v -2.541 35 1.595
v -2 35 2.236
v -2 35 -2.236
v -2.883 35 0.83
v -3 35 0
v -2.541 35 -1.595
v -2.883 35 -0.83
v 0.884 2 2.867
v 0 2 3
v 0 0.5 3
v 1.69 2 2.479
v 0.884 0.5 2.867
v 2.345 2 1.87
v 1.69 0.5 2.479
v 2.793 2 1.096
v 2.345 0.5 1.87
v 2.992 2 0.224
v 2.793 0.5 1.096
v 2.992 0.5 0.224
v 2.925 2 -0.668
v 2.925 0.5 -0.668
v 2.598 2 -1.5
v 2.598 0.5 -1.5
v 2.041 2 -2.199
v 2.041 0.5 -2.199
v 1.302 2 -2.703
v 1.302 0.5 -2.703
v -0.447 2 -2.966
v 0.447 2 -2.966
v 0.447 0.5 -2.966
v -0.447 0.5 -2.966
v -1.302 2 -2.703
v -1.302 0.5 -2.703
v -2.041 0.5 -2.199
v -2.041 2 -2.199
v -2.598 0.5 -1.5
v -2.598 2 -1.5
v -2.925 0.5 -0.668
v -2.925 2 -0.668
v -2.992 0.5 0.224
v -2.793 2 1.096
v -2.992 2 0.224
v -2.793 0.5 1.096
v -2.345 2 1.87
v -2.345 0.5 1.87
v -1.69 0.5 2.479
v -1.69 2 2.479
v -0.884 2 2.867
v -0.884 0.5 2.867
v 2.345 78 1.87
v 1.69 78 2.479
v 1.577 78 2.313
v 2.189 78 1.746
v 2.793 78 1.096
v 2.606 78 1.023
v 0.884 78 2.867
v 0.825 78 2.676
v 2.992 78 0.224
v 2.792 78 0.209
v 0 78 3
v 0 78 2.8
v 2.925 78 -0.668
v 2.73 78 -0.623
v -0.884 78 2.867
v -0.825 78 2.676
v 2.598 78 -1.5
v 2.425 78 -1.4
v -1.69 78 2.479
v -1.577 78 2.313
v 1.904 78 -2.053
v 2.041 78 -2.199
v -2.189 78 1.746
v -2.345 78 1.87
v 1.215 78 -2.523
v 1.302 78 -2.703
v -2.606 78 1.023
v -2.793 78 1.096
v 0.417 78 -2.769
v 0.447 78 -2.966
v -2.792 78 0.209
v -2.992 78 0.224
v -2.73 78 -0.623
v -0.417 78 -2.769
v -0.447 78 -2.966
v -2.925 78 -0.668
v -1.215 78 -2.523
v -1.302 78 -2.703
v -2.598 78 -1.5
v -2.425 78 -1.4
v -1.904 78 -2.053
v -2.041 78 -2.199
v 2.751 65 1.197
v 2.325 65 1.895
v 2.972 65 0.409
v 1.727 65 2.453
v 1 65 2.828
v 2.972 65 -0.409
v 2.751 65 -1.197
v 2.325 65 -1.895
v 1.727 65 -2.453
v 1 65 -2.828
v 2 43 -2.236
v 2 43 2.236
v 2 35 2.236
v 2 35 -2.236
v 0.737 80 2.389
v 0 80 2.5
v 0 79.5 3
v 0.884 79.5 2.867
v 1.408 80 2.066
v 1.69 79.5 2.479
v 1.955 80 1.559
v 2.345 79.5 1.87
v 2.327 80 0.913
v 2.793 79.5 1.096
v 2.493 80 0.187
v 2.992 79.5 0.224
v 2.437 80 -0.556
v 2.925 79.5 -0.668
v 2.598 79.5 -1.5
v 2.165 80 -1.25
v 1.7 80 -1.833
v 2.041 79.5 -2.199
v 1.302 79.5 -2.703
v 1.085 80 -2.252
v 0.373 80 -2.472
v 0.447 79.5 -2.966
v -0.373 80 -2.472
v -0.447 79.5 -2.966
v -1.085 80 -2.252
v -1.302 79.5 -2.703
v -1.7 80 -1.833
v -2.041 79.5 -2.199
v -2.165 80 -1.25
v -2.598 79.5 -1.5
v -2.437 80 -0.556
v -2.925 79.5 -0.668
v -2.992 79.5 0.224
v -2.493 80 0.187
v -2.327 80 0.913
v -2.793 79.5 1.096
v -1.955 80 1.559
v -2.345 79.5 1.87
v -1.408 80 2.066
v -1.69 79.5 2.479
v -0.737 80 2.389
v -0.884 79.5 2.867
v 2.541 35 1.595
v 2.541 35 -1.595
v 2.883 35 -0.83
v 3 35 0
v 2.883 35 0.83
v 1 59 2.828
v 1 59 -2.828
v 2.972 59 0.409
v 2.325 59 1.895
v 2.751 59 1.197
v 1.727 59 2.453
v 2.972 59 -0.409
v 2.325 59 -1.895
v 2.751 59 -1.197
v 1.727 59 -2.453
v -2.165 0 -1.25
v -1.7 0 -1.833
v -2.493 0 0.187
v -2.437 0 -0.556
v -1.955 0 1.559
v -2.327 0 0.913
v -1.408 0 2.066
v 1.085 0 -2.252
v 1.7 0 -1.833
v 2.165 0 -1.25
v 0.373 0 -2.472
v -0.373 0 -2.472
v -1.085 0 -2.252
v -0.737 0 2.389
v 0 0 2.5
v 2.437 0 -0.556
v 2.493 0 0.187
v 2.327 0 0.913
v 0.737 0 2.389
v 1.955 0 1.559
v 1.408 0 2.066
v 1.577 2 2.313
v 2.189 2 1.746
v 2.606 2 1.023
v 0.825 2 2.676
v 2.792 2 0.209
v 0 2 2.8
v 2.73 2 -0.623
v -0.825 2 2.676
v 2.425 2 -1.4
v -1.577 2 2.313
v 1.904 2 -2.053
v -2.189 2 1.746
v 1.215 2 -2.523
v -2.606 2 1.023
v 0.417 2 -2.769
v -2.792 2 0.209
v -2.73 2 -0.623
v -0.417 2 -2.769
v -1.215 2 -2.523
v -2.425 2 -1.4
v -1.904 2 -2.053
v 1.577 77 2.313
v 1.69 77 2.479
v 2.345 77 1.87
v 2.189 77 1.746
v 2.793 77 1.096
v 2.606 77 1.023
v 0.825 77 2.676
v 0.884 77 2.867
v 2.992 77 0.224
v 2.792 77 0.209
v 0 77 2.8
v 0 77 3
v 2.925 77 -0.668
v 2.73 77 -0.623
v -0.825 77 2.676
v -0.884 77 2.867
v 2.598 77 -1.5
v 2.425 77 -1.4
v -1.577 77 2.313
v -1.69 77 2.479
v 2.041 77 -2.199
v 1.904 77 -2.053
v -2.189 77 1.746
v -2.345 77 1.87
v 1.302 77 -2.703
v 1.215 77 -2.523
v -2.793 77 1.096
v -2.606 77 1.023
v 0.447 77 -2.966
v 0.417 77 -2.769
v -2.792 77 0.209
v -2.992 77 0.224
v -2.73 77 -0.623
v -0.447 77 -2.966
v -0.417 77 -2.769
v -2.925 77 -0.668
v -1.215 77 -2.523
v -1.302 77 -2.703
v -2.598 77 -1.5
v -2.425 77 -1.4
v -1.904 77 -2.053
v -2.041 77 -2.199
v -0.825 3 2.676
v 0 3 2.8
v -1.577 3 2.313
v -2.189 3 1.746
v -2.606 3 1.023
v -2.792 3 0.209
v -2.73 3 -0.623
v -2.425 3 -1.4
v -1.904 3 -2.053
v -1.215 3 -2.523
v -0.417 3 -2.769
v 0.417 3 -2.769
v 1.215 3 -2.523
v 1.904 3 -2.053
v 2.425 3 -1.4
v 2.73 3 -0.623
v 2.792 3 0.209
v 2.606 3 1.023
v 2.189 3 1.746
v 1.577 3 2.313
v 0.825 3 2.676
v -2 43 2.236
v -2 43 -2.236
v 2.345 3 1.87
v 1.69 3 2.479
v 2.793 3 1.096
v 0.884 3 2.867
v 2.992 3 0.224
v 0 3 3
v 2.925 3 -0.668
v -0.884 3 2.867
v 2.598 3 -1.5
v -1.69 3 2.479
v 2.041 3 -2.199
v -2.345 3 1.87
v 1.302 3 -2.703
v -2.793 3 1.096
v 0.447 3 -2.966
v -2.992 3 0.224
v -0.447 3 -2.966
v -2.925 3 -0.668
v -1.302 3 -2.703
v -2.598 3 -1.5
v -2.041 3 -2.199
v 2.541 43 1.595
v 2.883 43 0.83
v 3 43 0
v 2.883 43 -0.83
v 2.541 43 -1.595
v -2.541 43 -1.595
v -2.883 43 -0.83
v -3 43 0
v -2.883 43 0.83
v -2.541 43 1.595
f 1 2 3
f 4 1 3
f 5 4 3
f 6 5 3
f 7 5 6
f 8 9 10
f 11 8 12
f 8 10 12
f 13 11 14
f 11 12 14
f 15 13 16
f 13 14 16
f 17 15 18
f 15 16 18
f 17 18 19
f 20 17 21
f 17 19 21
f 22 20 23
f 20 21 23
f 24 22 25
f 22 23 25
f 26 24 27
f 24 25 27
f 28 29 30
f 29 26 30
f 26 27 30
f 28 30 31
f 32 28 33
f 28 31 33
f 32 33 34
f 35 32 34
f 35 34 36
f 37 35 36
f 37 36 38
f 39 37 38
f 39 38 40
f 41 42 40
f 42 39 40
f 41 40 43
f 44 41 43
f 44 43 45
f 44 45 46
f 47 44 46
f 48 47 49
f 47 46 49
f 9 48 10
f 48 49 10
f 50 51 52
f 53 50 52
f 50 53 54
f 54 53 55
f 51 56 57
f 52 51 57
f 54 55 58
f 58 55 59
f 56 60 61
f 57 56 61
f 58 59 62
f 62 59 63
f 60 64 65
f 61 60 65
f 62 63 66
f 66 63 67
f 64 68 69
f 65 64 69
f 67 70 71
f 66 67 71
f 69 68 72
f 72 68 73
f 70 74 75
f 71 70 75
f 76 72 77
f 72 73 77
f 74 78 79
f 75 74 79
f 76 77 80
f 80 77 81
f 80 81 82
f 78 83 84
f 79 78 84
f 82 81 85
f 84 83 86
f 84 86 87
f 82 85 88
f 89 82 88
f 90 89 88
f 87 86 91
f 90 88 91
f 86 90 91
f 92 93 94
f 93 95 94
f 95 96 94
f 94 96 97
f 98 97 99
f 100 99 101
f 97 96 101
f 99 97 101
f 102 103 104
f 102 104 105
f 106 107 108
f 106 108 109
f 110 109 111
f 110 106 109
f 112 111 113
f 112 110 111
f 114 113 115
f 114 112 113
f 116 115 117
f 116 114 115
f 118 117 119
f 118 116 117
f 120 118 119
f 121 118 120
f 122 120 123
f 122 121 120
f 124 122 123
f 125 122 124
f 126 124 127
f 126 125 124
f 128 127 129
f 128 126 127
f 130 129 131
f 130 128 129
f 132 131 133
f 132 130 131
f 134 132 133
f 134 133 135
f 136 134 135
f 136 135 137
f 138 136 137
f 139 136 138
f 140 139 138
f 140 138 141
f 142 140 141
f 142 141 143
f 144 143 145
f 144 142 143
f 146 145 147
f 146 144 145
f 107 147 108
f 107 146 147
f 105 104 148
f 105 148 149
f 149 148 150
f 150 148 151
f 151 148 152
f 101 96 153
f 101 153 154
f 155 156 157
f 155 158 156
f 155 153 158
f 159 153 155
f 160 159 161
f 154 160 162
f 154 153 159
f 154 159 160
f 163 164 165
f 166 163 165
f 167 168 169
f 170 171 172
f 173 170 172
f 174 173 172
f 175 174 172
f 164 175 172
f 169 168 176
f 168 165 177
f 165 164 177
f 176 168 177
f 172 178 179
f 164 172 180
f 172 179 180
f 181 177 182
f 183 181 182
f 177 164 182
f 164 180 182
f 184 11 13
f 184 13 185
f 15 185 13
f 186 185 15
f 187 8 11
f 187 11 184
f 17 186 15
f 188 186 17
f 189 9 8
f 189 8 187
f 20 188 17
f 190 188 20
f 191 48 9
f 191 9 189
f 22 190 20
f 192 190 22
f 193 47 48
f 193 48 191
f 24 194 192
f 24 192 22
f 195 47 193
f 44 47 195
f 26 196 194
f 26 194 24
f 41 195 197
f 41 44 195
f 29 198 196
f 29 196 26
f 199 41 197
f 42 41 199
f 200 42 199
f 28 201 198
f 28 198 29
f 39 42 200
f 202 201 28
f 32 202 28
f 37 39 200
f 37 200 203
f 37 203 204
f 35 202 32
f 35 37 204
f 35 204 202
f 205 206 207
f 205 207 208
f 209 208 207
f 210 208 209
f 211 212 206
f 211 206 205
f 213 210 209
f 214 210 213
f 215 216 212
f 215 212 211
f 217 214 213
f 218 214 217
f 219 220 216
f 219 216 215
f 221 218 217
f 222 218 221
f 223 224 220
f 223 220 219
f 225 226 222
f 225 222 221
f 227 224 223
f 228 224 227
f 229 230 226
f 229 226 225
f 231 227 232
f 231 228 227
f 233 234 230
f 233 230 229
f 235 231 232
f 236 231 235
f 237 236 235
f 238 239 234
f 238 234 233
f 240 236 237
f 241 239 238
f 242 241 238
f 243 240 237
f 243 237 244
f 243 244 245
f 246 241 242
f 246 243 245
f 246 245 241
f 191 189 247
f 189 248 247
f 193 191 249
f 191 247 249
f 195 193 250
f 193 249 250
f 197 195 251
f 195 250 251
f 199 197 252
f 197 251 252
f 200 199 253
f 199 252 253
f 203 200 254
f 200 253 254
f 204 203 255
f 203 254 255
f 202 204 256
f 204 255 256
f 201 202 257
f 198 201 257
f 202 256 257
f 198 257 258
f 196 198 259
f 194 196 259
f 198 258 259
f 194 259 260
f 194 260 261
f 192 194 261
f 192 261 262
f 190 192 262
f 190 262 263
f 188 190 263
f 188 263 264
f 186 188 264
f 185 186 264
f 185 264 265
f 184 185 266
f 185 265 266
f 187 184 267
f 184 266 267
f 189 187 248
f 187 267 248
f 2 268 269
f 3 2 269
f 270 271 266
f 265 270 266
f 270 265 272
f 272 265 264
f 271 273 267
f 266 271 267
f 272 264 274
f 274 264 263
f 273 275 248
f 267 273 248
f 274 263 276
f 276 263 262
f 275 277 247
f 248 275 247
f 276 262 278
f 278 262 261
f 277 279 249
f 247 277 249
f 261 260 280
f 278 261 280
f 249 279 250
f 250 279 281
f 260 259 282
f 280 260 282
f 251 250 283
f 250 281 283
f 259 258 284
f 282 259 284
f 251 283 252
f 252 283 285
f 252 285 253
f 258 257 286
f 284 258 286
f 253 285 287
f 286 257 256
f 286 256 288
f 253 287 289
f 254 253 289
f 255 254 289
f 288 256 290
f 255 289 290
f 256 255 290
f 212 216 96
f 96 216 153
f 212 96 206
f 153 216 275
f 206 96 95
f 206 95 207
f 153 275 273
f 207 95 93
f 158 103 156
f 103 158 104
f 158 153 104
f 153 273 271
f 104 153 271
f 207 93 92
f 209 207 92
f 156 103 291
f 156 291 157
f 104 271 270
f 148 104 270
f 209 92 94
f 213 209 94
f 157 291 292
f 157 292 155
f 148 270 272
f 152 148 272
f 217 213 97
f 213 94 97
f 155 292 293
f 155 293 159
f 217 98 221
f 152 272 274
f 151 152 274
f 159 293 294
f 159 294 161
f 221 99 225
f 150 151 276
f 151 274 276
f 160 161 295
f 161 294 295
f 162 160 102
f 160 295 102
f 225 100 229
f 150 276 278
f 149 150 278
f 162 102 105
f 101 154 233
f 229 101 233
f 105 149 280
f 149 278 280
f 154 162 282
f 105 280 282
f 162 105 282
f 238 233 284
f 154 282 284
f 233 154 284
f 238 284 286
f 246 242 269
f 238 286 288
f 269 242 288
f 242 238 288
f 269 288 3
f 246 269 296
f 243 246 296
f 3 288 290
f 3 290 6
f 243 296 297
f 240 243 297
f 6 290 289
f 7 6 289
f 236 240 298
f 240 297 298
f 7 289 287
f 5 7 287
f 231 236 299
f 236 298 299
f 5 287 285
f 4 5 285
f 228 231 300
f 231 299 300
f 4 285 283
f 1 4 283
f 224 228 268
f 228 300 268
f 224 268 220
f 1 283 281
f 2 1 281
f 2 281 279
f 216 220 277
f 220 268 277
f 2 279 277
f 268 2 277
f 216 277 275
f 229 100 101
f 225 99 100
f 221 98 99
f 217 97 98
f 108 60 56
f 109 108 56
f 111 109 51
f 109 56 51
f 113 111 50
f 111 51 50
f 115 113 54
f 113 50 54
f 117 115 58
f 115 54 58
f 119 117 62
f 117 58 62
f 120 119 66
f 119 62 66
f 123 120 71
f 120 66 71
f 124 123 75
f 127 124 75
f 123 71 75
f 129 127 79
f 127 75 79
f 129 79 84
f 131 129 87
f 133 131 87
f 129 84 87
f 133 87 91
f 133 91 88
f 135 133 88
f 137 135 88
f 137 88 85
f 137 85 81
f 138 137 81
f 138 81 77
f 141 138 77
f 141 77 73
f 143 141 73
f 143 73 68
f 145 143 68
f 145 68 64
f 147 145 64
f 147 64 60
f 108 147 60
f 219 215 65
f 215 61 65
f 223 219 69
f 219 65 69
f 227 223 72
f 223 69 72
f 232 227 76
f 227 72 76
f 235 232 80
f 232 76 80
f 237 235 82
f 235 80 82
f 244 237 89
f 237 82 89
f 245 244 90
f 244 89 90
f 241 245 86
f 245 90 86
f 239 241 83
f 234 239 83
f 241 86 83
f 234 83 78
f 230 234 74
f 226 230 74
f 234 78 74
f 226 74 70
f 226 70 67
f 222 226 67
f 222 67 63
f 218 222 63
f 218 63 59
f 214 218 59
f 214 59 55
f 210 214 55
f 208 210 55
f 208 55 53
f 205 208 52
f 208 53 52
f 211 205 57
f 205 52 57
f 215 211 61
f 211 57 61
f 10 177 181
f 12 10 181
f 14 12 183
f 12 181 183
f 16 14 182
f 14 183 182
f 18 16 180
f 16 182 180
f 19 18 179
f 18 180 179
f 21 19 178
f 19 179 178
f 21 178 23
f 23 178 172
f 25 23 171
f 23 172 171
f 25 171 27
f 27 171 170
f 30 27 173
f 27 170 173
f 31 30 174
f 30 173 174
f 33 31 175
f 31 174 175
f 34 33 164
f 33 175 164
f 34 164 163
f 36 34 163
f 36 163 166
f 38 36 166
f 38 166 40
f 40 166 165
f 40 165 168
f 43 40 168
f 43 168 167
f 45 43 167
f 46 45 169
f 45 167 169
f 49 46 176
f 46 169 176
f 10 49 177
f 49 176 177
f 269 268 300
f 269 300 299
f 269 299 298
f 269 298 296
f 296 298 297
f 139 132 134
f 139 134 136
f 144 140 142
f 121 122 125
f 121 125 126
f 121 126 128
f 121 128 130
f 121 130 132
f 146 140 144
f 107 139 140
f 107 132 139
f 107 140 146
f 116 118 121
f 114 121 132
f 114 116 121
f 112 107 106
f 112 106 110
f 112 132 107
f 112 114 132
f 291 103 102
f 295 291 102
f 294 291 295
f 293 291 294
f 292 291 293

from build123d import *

# Parameters (mm, degrees)
CROQUIS1_R              = 3
SALIENTE_EXTRUIR1_DEPTH = 80
CROQUIS2_W              = 5.531234996
CROQUIS2_H              = 1
CORTAR_EXTRUIR1_REACH   = 83.112
CORTAR_EXTRUIR1_START   = 1
CROQUIS3_W              = 6
CROQUIS3_H              = 6
CORTAR_EXTRUIR3_REACH   = 84.112
CORTAR_EXTRUIR3_START   = -2
CROQUIS3_2_W            = 6
CROQUIS3_2_H            = 8
CORTAR_EXTRUIR4_REACH   = 84.112
CORTAR_EXTRUIR4_START   = 2
CROQUIS3_4_W            = 6
CROQUIS3_4_H            = 8
CHAFL_N1_SIZE           = 0.5


with BuildPart() as part:
    # Croquis1 → Saliente-Extruir1 (new body)
    with BuildSketch(Plane(origin=(0, 0, 0), x_dir=(1, 0, 0), z_dir=(0, 1, 0))):
        Circle(CROQUIS1_R)
    extrude(amount=SALIENTE_EXTRUIR1_DEPTH)

    # Croquis2 → Cortar-Revolución1 (revolve, cut)
    with BuildSketch(Plane.XY):
        with Locations((5.565617498, 77.5)):
            Rectangle(CROQUIS2_W, CROQUIS2_H)
        with Locations((5.565617498, 2.5)):
            Rectangle(CROQUIS2_W, CROQUIS2_H)
    revolve(axis=Axis((0, 80, 0), (0, -1, 0)), mode=Mode.SUBTRACT)

    # Croquis3 → Cortar-Extruir1 (cut, up to next)
    with BuildSketch(Plane(origin=(0, 0, 0), x_dir=(0, 0, -1), z_dir=(1, 0, 0)).offset(CORTAR_EXTRUIR1_START), mode=Mode.PRIVATE) as cortar_extruir1_sk1:
        with Locations((0, 62)):
            Rectangle(CROQUIS3_W, CROQUIS3_H)
    cortar_extruir1_tool1 = extrude(cortar_extruir1_sk1.sketch, amount=CORTAR_EXTRUIR1_REACH, mode=Mode.PRIVATE) & part.part
    add(cortar_extruir1_tool1.solids().sort_by_distance((1, 62, 0))[0], mode=Mode.SUBTRACT)

    # Croquis3<2> → Cortar-Extruir3 (cut, up to next)
    with BuildSketch(Plane(origin=(0, 0, 0), x_dir=(0, 0, -1), z_dir=(1, 0, 0)).offset(CORTAR_EXTRUIR3_START), mode=Mode.PRIVATE) as cortar_extruir3_sk1:
        with Locations((0, 39)):
            Rectangle(CROQUIS3_2_W, CROQUIS3_2_H)
    cortar_extruir3_tool1 = extrude(cortar_extruir3_sk1.sketch, amount=-CORTAR_EXTRUIR3_REACH, mode=Mode.PRIVATE) & part.part
    add(cortar_extruir3_tool1.solids().sort_by_distance((-2, 39, 0))[0], mode=Mode.SUBTRACT)

    # Croquis3<4> → Cortar-Extruir4 (cut, up to next)
    with BuildSketch(Plane(origin=(0, 0, 0), x_dir=(0, 0, -1), z_dir=(1, 0, 0)).offset(CORTAR_EXTRUIR4_START), mode=Mode.PRIVATE) as cortar_extruir4_sk1:
        with Locations((0, 39)):
            Rectangle(CROQUIS3_4_W, CROQUIS3_4_H)
    cortar_extruir4_tool1 = extrude(cortar_extruir4_sk1.sketch, amount=CORTAR_EXTRUIR4_REACH, mode=Mode.PRIVATE) & part.part
    add(cortar_extruir4_tool1.solids().sort_by_distance((2, 39, 0))[0], mode=Mode.SUBTRACT)

    # Chaflán1
    chafl_n1_edges = [part.edges().sort_by_distance(p)[0] for p in [
        (-3, 0, 0),
        (-3, 80, 0),
    ]]
    chamfer(chafl_n1_edges, length=CHAFL_N1_SIZE)


solid = part.part
